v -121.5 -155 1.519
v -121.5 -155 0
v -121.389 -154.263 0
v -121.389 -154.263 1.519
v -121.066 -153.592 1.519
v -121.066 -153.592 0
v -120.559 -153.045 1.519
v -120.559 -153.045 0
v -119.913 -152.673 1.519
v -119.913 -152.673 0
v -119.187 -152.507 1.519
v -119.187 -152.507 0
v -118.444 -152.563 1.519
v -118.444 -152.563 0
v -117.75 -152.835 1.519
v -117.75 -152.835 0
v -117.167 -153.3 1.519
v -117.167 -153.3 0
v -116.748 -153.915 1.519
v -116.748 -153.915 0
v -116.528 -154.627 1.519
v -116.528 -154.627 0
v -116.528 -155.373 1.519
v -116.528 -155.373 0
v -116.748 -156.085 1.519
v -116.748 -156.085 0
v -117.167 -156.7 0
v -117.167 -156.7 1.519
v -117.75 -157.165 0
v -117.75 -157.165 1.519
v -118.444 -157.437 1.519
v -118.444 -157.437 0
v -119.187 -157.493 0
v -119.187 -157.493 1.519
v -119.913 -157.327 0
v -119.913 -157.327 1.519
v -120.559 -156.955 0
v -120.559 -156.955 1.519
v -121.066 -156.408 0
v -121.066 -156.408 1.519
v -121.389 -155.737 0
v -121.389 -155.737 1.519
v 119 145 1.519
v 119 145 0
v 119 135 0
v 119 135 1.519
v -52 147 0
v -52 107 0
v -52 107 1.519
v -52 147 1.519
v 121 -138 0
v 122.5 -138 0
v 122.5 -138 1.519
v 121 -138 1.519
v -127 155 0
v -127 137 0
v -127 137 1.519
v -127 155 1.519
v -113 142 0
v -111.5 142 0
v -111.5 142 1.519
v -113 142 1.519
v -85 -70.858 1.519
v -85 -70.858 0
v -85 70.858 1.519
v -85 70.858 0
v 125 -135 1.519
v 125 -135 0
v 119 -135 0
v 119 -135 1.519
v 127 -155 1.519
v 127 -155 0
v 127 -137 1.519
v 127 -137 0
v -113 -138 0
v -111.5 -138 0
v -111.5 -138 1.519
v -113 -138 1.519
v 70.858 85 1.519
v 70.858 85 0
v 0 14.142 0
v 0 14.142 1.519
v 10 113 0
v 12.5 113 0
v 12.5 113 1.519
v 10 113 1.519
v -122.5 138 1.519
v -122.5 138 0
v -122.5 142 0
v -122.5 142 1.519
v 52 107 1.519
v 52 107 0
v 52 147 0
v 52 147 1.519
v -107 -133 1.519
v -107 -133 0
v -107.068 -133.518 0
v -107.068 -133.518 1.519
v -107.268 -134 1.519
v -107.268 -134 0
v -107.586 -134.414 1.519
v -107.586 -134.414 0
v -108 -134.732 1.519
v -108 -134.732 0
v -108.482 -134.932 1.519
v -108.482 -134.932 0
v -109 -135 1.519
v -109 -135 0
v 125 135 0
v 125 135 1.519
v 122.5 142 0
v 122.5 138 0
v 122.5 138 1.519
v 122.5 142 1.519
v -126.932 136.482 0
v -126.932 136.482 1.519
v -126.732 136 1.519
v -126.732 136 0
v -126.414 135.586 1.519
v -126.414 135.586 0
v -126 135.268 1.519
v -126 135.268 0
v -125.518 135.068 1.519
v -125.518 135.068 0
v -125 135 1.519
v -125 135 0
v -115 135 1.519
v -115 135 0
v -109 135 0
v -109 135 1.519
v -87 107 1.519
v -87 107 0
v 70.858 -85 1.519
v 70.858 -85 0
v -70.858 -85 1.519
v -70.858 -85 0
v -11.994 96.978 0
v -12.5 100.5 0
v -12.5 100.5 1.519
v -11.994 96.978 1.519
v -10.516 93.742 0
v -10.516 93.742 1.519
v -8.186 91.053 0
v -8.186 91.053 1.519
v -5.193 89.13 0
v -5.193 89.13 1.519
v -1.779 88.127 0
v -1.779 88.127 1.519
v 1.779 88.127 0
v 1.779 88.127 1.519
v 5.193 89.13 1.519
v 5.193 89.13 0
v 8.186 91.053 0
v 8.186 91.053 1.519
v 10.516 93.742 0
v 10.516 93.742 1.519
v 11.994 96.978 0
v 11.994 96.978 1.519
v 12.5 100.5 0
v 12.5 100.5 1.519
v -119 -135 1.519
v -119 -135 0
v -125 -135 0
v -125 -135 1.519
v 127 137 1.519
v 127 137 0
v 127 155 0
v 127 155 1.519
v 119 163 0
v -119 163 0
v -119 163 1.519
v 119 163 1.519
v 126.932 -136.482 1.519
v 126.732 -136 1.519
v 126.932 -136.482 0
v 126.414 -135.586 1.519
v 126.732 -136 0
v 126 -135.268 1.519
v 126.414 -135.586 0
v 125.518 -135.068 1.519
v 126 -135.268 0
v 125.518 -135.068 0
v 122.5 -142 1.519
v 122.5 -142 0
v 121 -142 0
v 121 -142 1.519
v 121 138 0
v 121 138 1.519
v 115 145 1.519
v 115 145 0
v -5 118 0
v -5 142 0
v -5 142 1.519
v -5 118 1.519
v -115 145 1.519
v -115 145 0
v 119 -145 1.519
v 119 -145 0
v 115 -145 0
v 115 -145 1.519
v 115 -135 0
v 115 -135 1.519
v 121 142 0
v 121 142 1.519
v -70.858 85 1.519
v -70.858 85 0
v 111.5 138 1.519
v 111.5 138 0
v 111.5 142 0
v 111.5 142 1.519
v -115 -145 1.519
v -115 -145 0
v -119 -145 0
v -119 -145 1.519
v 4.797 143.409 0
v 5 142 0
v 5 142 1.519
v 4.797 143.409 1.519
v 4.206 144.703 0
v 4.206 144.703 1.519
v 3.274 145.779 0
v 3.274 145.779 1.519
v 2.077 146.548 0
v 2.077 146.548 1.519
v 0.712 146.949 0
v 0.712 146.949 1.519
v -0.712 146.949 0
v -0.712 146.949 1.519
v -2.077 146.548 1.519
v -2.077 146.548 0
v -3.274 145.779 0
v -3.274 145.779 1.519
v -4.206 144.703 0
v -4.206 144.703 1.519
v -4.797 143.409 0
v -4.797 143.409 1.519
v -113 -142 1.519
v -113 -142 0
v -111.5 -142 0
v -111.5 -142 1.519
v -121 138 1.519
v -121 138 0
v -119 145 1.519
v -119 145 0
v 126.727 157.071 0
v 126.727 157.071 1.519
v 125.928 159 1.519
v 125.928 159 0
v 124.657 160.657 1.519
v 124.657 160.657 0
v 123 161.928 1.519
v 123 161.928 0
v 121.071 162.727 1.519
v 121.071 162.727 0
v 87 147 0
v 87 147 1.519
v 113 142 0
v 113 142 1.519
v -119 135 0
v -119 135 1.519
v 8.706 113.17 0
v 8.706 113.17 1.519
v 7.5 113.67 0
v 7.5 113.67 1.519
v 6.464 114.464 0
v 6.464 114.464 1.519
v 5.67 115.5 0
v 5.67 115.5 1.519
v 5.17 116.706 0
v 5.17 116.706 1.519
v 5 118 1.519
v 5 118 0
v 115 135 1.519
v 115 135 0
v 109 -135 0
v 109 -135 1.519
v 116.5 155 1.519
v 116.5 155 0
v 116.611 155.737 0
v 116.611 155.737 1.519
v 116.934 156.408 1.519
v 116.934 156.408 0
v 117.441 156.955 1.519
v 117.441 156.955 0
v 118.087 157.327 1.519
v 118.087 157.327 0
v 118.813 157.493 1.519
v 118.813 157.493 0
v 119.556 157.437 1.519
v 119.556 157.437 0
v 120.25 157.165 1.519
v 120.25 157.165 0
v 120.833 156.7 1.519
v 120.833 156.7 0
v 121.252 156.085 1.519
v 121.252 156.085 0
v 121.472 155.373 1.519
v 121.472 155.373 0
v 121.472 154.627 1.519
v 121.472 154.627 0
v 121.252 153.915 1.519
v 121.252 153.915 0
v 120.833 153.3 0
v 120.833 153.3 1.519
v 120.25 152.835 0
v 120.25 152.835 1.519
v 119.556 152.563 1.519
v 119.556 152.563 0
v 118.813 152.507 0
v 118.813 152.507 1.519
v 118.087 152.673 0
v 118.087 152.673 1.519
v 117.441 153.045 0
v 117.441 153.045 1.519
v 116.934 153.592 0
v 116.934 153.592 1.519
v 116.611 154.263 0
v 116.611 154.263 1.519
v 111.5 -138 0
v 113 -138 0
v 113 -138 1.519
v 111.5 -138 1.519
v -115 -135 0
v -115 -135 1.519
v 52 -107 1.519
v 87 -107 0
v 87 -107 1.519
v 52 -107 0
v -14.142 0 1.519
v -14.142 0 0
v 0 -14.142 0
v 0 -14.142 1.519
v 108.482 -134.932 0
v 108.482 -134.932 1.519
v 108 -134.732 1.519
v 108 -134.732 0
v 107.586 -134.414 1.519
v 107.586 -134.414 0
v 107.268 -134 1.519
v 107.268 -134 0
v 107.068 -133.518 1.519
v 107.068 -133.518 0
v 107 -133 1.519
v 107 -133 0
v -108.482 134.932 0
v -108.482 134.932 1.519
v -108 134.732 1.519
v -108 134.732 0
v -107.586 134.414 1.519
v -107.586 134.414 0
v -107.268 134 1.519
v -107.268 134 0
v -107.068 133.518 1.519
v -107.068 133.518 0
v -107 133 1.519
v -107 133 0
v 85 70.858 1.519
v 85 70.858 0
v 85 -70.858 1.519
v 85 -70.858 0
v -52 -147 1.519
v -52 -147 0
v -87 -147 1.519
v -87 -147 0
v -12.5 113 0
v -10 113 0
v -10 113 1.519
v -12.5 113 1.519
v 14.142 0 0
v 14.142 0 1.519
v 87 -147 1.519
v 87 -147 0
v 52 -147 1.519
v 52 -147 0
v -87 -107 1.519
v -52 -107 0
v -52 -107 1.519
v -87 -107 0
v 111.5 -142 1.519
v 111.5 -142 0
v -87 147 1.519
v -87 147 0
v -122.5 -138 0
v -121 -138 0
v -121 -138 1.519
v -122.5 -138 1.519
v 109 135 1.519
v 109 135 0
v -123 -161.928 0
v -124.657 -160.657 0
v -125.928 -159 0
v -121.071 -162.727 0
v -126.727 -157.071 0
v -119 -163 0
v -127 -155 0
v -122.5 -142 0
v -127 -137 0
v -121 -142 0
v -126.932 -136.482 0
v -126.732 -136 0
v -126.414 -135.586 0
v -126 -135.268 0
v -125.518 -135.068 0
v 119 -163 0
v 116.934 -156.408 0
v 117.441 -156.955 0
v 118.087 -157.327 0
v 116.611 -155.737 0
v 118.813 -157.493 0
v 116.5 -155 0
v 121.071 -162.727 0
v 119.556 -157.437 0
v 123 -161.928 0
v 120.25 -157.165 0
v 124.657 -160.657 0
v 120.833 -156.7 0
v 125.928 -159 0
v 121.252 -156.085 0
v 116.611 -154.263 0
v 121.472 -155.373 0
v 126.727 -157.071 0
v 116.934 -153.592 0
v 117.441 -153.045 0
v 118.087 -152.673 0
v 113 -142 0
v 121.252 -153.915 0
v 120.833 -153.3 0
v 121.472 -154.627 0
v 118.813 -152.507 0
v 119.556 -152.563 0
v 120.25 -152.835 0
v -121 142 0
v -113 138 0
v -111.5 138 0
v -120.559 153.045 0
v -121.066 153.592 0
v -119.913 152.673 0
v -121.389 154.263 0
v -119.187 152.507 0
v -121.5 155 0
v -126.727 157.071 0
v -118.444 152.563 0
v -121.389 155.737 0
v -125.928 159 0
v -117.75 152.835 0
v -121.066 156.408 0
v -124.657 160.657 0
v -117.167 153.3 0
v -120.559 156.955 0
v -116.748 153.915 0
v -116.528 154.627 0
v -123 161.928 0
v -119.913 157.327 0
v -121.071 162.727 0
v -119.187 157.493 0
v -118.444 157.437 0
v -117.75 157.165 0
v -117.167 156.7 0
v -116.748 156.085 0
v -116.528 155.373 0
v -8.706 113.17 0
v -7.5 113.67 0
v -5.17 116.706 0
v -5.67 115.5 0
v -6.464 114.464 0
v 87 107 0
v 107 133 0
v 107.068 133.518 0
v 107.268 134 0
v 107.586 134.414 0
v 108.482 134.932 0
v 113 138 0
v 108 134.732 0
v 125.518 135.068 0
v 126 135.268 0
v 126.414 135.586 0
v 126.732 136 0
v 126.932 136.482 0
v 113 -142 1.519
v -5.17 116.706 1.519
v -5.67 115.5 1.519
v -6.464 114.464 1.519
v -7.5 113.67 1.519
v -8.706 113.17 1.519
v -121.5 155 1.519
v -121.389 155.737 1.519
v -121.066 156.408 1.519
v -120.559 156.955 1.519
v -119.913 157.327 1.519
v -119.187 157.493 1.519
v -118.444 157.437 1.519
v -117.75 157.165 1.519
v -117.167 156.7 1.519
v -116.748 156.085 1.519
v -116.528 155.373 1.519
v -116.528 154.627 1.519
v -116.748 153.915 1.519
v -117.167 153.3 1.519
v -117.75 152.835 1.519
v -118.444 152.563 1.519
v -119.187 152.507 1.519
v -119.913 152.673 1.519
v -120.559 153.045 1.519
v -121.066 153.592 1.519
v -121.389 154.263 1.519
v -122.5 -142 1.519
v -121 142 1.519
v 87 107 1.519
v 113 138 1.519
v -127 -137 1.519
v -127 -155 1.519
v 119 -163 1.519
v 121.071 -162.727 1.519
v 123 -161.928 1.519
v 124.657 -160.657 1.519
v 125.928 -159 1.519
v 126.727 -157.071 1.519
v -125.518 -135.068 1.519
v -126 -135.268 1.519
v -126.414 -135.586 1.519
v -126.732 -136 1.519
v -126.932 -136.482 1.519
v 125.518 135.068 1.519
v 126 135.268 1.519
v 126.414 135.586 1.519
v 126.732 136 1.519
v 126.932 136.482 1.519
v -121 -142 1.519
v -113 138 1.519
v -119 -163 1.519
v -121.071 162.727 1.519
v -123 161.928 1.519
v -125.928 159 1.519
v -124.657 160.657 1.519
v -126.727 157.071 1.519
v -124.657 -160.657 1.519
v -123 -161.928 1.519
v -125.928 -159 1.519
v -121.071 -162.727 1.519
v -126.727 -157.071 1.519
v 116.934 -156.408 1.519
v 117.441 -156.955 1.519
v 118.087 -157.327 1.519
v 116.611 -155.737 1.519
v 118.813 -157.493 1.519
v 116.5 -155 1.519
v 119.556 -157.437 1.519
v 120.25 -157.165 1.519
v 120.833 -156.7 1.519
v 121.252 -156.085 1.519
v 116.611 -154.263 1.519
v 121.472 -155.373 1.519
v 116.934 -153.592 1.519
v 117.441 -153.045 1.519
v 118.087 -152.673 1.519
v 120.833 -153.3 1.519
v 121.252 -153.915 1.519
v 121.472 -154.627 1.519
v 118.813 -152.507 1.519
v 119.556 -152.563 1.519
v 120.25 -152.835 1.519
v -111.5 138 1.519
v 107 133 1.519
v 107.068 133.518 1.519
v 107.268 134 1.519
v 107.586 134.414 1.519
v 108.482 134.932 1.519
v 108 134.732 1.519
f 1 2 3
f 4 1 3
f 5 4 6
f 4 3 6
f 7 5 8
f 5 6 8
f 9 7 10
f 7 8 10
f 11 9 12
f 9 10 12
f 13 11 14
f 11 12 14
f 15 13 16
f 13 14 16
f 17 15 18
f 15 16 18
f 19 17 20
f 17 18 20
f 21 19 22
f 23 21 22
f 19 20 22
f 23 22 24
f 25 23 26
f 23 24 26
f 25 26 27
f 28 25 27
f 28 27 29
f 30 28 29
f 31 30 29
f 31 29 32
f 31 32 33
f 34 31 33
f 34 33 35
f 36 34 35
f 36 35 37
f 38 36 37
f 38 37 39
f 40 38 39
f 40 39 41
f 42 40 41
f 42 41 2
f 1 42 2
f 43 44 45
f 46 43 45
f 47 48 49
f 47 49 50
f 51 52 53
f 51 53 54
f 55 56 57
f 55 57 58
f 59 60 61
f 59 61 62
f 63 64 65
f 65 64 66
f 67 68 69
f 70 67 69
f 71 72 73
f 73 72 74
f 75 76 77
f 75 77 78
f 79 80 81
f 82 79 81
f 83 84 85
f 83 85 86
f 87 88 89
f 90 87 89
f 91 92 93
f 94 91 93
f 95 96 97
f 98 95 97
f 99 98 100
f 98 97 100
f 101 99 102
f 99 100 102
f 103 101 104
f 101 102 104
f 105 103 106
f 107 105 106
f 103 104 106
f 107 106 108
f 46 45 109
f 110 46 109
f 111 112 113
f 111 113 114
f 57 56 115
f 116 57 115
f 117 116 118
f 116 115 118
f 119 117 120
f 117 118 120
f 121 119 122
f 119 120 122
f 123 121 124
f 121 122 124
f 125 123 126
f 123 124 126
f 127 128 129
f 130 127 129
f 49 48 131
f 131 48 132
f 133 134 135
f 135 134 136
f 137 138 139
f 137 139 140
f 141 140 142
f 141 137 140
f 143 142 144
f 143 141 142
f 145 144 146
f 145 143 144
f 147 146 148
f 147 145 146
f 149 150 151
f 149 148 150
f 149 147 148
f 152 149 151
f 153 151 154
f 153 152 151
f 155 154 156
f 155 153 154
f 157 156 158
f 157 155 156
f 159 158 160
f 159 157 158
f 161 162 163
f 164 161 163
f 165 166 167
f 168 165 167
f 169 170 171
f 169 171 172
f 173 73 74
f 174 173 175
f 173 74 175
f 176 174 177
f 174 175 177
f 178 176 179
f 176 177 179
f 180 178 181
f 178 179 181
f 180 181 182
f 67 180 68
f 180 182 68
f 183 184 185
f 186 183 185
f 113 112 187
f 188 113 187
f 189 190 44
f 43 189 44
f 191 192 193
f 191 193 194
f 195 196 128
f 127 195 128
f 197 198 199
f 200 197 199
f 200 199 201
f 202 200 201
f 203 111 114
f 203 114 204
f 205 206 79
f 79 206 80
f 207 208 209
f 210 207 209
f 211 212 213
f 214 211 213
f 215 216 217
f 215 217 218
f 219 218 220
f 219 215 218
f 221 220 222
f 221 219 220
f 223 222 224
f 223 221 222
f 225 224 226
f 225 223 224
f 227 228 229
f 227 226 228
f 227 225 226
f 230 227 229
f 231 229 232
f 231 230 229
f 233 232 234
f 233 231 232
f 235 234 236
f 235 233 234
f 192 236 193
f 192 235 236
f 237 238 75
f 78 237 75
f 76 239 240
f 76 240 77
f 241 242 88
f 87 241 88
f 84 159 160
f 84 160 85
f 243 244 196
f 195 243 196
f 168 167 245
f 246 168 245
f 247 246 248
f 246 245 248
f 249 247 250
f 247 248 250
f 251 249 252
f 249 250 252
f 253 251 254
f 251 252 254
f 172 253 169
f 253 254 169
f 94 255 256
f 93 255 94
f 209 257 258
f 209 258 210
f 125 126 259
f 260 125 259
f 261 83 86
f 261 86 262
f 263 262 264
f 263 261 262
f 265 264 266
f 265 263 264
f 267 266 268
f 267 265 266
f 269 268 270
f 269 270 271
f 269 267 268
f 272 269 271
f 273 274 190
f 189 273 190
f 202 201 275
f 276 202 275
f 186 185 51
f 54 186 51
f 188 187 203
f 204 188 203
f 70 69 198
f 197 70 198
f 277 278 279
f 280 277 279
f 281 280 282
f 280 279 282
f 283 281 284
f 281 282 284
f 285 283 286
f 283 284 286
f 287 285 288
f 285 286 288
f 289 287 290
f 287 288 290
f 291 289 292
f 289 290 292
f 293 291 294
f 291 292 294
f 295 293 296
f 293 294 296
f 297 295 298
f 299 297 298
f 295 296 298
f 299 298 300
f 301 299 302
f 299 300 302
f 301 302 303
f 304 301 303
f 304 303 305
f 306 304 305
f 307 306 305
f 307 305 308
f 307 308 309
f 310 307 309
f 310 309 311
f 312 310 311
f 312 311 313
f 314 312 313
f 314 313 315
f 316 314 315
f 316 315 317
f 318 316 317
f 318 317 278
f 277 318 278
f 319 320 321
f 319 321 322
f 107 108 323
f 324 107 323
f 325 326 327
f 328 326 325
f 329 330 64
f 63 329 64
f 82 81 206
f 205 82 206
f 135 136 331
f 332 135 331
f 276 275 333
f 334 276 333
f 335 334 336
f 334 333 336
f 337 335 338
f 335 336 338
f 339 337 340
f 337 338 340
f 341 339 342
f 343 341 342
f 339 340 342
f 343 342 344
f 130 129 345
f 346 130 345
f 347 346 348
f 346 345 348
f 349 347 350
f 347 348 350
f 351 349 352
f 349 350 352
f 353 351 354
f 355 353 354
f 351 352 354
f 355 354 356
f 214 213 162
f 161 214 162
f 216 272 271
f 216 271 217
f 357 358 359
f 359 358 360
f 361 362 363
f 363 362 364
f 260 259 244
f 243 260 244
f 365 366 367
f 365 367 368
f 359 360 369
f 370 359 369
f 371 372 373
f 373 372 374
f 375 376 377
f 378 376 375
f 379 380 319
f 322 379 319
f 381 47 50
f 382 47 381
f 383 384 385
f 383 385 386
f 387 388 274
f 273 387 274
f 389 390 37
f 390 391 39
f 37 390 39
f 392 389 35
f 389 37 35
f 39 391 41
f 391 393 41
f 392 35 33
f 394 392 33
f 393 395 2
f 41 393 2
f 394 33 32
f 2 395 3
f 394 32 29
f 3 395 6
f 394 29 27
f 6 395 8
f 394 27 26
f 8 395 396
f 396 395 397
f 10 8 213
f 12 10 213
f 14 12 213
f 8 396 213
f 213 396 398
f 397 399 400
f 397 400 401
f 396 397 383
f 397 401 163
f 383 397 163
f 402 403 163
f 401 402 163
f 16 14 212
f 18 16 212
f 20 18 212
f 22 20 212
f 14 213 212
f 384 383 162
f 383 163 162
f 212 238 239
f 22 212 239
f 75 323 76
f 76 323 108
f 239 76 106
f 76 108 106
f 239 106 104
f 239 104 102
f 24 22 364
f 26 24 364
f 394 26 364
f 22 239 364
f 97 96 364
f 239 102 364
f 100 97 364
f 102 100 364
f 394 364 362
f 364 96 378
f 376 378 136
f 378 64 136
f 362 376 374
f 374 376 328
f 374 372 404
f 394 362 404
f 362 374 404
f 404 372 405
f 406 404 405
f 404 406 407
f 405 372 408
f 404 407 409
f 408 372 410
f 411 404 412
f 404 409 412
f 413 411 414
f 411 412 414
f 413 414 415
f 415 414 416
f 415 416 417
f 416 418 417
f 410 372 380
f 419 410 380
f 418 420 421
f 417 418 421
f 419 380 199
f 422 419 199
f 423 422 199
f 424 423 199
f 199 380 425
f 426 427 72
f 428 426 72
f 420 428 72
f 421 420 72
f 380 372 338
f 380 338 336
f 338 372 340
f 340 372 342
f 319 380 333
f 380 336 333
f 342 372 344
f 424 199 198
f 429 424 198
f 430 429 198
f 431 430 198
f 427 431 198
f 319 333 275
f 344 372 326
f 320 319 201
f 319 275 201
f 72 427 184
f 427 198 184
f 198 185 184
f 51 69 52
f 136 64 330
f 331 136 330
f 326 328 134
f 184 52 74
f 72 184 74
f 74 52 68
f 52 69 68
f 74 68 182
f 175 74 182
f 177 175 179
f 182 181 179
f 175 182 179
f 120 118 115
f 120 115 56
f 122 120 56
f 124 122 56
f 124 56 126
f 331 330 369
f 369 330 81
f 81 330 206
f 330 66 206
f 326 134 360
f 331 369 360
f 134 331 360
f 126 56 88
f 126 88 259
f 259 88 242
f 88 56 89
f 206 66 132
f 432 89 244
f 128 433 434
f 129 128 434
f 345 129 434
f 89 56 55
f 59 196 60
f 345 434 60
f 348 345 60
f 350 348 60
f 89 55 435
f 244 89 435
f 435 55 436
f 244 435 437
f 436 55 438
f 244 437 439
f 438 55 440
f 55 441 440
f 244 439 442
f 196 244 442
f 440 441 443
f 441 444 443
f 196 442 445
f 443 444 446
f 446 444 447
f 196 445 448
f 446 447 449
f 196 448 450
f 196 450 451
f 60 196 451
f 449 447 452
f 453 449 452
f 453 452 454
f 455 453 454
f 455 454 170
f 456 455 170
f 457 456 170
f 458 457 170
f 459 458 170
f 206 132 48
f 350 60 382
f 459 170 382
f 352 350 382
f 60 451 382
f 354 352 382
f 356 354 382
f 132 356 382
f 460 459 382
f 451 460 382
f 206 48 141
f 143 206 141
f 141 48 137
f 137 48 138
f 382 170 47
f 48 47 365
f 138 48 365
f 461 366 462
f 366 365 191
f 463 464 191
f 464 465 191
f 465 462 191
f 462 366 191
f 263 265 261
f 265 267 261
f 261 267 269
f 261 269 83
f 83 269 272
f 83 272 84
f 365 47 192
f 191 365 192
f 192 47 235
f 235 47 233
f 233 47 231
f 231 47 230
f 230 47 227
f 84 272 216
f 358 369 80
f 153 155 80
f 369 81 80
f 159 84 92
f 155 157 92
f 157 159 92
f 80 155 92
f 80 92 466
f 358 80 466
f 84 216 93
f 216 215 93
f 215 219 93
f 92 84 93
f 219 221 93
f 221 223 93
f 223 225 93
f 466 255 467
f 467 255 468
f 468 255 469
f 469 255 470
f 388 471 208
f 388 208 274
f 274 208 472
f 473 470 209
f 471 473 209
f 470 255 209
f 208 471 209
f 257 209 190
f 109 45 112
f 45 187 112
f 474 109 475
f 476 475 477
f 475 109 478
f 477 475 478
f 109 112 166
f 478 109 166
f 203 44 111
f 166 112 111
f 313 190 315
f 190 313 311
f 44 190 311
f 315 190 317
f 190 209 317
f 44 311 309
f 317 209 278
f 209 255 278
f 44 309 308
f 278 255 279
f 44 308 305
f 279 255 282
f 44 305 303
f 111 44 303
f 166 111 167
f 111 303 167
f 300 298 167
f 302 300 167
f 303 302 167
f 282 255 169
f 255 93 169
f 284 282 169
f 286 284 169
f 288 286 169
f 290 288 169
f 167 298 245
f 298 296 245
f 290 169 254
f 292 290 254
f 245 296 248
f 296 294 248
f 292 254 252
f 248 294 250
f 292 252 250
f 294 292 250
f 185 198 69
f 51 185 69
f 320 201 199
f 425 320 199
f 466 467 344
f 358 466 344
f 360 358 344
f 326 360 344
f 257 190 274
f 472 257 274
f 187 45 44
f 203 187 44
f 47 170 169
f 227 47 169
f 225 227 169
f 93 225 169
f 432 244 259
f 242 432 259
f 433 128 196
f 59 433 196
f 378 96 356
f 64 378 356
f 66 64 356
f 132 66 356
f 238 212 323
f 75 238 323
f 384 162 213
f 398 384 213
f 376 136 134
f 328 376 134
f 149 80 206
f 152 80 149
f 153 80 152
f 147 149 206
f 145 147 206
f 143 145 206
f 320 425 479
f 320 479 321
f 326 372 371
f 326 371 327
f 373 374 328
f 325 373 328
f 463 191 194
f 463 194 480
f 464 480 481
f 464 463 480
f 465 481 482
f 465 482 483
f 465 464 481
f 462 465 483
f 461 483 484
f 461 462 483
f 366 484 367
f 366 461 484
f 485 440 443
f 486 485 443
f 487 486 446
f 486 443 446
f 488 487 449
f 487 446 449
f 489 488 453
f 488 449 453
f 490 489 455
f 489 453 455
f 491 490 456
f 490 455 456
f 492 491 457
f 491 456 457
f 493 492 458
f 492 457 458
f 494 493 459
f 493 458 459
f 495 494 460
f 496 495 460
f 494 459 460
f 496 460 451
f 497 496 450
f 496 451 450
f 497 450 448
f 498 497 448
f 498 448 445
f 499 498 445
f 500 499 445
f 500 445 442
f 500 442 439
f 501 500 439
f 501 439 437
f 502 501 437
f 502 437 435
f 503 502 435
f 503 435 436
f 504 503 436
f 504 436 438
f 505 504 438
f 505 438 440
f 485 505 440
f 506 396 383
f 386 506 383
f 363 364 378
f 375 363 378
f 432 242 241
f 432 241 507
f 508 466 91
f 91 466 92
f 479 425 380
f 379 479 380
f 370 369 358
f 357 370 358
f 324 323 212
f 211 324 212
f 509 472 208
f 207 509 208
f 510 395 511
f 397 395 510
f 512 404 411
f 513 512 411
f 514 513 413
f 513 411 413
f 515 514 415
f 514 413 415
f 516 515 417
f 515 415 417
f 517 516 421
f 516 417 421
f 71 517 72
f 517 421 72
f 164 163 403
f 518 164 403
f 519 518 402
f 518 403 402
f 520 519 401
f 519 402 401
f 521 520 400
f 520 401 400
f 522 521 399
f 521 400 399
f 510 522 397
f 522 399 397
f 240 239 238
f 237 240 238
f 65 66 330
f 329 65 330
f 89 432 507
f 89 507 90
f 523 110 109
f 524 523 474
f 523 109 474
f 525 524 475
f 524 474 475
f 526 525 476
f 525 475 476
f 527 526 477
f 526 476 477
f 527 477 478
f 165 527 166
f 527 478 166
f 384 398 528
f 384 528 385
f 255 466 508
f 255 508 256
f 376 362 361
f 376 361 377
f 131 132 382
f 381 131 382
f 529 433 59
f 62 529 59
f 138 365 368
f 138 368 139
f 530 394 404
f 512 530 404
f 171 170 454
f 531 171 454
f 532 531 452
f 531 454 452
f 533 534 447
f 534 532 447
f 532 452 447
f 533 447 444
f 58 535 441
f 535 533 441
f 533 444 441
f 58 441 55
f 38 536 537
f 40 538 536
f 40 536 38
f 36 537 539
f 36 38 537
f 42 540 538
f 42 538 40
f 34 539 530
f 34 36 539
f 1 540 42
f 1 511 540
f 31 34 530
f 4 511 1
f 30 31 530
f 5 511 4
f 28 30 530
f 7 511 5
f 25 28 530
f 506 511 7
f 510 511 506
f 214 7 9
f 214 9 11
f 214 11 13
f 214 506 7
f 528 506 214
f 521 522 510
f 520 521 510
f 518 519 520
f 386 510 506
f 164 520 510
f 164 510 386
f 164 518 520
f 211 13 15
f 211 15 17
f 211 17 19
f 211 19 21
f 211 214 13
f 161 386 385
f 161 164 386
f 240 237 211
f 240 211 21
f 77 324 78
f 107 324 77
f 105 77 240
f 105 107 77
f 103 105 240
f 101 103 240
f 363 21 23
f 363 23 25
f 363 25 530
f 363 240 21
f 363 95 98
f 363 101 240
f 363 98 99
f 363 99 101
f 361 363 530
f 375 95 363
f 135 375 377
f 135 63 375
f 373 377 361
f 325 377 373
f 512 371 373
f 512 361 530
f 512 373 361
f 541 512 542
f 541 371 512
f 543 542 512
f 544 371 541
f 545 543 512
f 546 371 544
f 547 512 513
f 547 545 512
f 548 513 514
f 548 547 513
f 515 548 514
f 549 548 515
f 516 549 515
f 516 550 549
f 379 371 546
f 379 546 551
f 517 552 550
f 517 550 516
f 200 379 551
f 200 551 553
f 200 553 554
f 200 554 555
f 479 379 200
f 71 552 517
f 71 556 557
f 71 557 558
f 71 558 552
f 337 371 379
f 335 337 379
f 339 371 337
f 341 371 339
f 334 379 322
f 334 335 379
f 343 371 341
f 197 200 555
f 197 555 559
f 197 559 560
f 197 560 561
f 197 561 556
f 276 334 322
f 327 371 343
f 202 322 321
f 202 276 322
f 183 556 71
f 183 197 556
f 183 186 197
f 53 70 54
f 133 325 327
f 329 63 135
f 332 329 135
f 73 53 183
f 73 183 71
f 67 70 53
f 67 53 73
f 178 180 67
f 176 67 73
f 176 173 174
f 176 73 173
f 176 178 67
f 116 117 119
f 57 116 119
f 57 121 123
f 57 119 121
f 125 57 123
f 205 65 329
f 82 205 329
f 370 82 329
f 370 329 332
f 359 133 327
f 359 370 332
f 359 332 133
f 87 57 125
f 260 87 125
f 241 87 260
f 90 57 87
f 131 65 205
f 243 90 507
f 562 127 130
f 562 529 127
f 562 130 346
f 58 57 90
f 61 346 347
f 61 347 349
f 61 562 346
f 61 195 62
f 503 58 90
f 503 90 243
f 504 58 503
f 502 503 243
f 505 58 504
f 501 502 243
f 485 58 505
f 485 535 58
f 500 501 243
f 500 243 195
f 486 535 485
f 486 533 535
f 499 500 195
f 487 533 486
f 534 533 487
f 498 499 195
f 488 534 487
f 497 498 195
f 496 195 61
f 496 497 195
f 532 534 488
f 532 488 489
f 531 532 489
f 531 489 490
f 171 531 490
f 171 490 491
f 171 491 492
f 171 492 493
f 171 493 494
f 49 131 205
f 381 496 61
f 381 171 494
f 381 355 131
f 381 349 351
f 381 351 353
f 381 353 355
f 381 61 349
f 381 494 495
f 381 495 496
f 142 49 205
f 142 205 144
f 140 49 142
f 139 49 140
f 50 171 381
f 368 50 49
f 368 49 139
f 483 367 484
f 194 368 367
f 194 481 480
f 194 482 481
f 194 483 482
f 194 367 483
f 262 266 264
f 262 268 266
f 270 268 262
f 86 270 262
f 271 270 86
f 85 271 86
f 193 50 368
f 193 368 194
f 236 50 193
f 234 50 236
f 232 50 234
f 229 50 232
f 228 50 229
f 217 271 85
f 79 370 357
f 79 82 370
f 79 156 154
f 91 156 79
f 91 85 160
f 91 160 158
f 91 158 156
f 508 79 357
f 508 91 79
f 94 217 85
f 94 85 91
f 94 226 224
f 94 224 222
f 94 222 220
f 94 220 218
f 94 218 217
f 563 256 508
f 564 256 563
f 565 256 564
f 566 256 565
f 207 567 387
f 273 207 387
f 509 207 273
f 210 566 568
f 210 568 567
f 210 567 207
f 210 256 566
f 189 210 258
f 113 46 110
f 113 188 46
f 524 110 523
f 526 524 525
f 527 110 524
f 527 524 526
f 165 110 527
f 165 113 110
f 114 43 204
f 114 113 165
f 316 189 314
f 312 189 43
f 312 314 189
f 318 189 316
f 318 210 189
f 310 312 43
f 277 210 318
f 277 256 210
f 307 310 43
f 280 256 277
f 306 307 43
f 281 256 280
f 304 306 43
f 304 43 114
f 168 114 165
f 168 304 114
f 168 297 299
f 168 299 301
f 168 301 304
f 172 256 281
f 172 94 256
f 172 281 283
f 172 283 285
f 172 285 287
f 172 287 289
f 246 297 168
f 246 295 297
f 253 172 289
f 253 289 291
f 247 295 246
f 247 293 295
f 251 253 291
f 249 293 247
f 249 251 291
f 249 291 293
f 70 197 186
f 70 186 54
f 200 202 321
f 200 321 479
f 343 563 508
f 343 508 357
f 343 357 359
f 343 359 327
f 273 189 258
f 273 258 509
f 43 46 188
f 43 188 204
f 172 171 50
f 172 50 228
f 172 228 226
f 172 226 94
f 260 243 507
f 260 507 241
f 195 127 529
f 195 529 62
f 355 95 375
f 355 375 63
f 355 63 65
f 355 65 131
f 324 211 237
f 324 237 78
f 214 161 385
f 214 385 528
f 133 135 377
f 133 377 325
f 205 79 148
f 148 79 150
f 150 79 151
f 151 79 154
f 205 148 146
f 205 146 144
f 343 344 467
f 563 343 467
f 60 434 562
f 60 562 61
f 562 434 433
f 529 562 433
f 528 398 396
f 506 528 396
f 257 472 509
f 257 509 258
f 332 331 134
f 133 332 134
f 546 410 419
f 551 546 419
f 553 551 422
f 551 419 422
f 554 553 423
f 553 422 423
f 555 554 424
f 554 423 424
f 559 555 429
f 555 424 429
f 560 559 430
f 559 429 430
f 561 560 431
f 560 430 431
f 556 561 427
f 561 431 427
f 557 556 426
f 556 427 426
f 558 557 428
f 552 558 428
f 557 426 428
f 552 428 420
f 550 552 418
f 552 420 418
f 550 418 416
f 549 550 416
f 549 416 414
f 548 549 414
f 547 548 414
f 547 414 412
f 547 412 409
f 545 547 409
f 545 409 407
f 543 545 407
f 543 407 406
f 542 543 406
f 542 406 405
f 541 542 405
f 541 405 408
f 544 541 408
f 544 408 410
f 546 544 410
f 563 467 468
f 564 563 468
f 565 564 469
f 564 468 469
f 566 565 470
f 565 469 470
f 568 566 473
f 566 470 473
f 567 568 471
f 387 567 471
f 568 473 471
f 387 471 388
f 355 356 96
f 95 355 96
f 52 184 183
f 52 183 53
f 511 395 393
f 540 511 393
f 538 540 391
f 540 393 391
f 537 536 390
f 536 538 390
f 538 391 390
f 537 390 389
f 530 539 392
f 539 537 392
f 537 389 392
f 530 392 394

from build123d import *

# Parameters (mm, degrees)
SKETCH1_W          = 254
SKETCH1_H          = 326
BASE_FLANGE1_DEPTH = 1.51892
SKETCH6_R          = 2.5
SKETCH6_W          = 1.5
SKETCH6_H          = 4
SKETCH6_W_2        = 35
SKETCH6_H_2        = 40
CUT_EXTRUDE1_DEPTH = 10
CUT_EXTRUDE2_DEPTH = 10


# Sheet-metal steps are written as plain solids
with BuildPart() as part:
    # Sketch1 → Base-Flange1 (new body)
    with BuildSketch(Plane.XY):
        Rectangle(SKETCH1_W, SKETCH1_H)
    extrude(amount=BASE_FLANGE1_DEPTH)

    # Sketch6 → Cut-Extrude1 (cut)
    with BuildSketch(Plane(origin=(0, 0, 0), x_dir=(-1, 0, 0), z_dir=(0, 0, -1))):
        with BuildLine():
            ThreePointArc((-124.99999998, 135), (-126.414213542, 135.585786438), (-126.99999998, 137))
            Line((-127, 137), (-127, -137))
            ThreePointArc((-126.99999998, -137), (-126.414213542, -135.585786438), (-124.99999998, -135))
            Line((-124.99999998, -135), (-119, -135))
            Line((-119, -135), (-119, -145))
            Line((-119, -145), (-115, -145))
            Line((-115, -145), (-115, -135))
            Line((-115, -135), (-109, -135))
            ThreePointArc((-109, -135), (-107.585786438, -134.414213562), (-107, -133))
            Line((-107, -133), (-107, 133))
            ThreePointArc((-107, 133), (-107.585786438, 134.414213562), (-109, 135))
            Line((-109, 135), (-115, 135))
            Line((-115, 135), (-115, 145))
            Line((-115, 145), (-119, 145))
            Line((-119, 145), (-119, 135))
            Line((-119, 135), (-124.99999998, 135))
        make_face()
        with Locations((-119, 155)):
            Circle(SKETCH6_R)
        with BuildLine():
            ThreePointArc((-126.99999998, 155), (-124.656854247, 160.656854252), (-119, 163))
            Line((-119, 163), (-127, 163))
            Line((-127, 163), (-127, 155))
        make_face()
        with Locations((-121.75, 140)):
            Rectangle(SKETCH6_W, SKETCH6_H)
        with Locations((-112.25, 140)):
            Rectangle(SKETCH6_W, SKETCH6_H)
        with Locations((-69.5, 127)):
            Rectangle(SKETCH6_W_2, SKETCH6_H_2)
        with BuildLine():
            Line((127, -137), (127, 137))
            ThreePointArc((127, 137), (126.414213562, 135.585786438), (125, 135))
            Line((125, 135), (119, 135))
            Line((119, 135), (119, 145))
            Line((119, 145), (115, 145))
            Line((115, 145), (115, 135))
            Line((115, 135), (109, 135))
            ThreePointArc((109, 135), (107.585786438, 134.414213562), (107, 133))
            Line((107, 133), (107, -133))
            ThreePointArc((107, -133), (107.585786438, -134.414213562), (109, -135))
            Line((109, -135), (115, -135))
            Line((115, -135), (115, -145))
            Line((115, -145), (119, -145))
            Line((119, -145), (119, -135))
            Line((119, -135), (125, -135))
            ThreePointArc((125, -135), (126.414213562, -135.585786438), (127, -137))
        make_face()
        with Locations((121.75, 140)):
            Rectangle(SKETCH6_W, SKETCH6_H)
        with Locations((112.25, 140)):
            Rectangle(SKETCH6_W, SKETCH6_H)
        with Locations((119, 155)):
            Circle(SKETCH6_R)
        with Locations((69.5, 127)):
            Rectangle(SKETCH6_W_2, SKETCH6_H_2)
        with BuildLine():
            ThreePointArc((119, 163), (124.656854249, 160.656854249), (127, 155))
            Line((127, 155), (127, 163))
            Line((127, 163), (119, 163))
        make_face()
        with BuildLine():
            ThreePointArc((-10, 113), (-6.464466094, 114.464466094), (-5, 118))
            Line((-5, 118), (-5, 142))
            ThreePointArc((-5, 142), (0, 147), (5, 142))
            Line((5, 142), (5, 118))
            ThreePointArc((5, 118), (6.464466094, 114.464466094), (10, 113))
            Line((10, 113), (12.5, 113))
            Line((12.5, 113), (12.5, 100.5))
            ThreePointArc((12.5, 100.5), (0, 88), (-12.5, 100.5))
            Line((-12.5, 100.5), (-12.5, 113))
            Line((-12.5, 113), (-10, 113))
        make_face()
        with Locations((-69.5, -127)):
            Rectangle(SKETCH6_W_2, SKETCH6_H_2)
        with Locations((-119, -155)):
            Circle(SKETCH6_R)
        with BuildLine():
            Line((-127, -163), (-119, -163))
            ThreePointArc((-119, -163), (-124.656854232, -160.656854238), (-126.99999998, -155))
            Line((-127, -155), (-127, -163))
        make_face()
        with Locations((-121.75, -140)):
            Rectangle(SKETCH6_W, SKETCH6_H)
        with Locations((-112.25, -140)):
            Rectangle(SKETCH6_W, SKETCH6_H)
        with Locations((69.5, -127)):
            Rectangle(SKETCH6_W_2, SKETCH6_H_2)
        with Locations((112.25, -140)):
            Rectangle(SKETCH6_W, SKETCH6_H)
        with Locations((121.75, -140)):
            Rectangle(SKETCH6_W, SKETCH6_H)
        with Locations((119, -155)):
            Circle(SKETCH6_R)
        with BuildLine():
            Line((127, -163), (127, -155))
            ThreePointArc((127, -155), (124.656854249, -160.656854249), (119, -163))
            Line((119, -163), (127, -163))
        make_face()
    extrude(amount=-CUT_EXTRUDE1_DEPTH, mode=Mode.SUBTRACT)

    # Sketch7 → Cut-Extrude2 (cut)
    with BuildSketch(Plane(origin=(0, 0, 0), x_dir=(-1, 0, 0), z_dir=(0, 0, -1))):
        Polygon((85, -70.857864376), (85, 70.857864376), (14.142135624, 0), align=None)
        Polygon((0, 14.142135624), (70.857864376, 85), (-70.857864376, 85), align=None)
        Polygon((-85, -70.857864376), (-14.142135624, 0), (-85, 70.857864376), align=None)
        Polygon((70.857864376, -85), (0, -14.142135624), (-70.857864376, -85), align=None)
    extrude(amount=-CUT_EXTRUDE2_DEPTH, mode=Mode.SUBTRACT)


solid = part.part
